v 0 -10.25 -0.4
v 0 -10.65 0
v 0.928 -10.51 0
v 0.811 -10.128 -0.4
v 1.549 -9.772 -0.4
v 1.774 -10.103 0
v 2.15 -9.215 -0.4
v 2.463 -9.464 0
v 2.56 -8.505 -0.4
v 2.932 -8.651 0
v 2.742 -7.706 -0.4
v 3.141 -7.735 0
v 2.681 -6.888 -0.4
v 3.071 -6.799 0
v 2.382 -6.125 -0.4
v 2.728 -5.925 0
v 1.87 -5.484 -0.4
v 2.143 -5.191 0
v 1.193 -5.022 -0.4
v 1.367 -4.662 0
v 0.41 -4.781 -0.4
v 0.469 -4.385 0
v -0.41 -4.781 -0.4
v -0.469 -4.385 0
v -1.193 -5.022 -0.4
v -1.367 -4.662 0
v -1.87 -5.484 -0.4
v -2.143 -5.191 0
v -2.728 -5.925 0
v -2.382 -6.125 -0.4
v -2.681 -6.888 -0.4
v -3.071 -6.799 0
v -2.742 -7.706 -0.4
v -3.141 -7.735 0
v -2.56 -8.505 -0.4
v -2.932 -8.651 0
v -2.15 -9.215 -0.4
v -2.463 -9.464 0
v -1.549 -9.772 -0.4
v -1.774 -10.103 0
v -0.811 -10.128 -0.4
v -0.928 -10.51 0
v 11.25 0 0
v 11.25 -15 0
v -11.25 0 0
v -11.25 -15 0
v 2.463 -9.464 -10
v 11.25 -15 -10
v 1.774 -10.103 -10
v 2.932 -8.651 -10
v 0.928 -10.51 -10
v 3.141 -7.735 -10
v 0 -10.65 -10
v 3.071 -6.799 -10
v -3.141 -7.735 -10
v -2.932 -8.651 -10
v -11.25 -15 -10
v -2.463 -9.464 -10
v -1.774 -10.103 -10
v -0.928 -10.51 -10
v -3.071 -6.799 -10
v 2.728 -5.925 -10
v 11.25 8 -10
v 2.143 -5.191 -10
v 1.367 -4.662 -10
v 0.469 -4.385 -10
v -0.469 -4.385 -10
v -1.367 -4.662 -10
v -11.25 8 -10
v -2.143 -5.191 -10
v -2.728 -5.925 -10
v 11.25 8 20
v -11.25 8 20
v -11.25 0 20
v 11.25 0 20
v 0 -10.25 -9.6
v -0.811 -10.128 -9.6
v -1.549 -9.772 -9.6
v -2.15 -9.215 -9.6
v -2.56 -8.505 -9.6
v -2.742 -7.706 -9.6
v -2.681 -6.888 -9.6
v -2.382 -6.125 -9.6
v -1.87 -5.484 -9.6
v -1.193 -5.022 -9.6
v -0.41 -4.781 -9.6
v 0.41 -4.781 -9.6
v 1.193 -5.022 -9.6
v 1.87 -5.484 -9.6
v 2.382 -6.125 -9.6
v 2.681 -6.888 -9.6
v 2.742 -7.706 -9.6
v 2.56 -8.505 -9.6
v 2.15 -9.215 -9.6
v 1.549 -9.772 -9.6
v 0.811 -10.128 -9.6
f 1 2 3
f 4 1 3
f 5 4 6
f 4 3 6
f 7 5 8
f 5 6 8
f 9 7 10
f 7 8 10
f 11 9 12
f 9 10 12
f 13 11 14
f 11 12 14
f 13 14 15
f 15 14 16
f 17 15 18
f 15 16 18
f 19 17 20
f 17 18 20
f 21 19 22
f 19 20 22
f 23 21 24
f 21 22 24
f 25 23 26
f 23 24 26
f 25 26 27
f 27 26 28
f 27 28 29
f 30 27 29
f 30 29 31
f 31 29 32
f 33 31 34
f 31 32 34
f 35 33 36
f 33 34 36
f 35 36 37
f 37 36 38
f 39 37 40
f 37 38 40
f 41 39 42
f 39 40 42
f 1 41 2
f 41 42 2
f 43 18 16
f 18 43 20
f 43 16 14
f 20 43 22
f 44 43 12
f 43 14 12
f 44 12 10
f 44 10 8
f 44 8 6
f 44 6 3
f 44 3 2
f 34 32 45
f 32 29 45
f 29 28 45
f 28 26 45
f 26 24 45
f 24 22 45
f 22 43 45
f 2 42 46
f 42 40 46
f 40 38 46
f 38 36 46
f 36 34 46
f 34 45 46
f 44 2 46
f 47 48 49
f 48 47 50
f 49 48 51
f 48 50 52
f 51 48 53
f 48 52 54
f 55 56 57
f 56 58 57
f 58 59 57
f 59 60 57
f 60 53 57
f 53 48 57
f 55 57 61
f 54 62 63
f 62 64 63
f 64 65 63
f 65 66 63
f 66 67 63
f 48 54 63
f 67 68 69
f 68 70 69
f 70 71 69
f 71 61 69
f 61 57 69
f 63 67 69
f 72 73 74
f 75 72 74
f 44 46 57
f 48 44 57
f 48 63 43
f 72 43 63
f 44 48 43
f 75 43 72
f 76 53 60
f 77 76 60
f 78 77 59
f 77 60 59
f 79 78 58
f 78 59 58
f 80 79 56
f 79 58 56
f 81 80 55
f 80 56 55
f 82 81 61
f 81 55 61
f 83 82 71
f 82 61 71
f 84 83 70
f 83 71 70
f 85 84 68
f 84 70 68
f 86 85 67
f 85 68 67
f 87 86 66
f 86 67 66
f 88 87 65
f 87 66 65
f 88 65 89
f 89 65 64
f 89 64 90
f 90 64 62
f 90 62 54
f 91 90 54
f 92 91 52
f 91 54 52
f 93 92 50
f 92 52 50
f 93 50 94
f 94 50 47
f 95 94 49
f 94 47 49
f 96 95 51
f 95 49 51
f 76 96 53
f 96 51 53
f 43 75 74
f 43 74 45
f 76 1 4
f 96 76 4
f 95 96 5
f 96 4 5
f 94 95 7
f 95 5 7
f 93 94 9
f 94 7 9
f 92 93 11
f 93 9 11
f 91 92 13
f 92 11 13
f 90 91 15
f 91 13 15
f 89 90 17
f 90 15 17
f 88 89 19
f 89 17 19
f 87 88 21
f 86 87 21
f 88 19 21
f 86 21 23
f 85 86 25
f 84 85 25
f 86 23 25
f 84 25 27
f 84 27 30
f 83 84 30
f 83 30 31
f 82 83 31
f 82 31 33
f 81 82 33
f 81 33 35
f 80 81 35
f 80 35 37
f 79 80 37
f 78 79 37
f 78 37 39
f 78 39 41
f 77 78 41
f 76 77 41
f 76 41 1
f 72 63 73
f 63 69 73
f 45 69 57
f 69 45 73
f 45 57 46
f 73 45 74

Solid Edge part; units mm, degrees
sketch "Sketch1" plane through (0, 0, 0) normal (1, 0, 0) x (0, 1, 0)
  line L0 (-15, 0) -> (-15, -10)
  line L1 (-15, -10) -> (8, -10)
  line L2 (8, -10) -> (8, 20)
  line L3 (8, 20) -> (0, 20)
  line L4 (0, 20) -> (0, 0)
  line L5 (0, 0) -> (-15, 0)
  dimension "D1" = 8
  dimension "D2" = 15
  dimension "D3" = 10
  dimension "D4" = 20
extrude "Protrusion1" add sketch "Sketch1" along normal mid plane 22.5
hole "Hole_1" at (0, -7.5, 0) direction (0, 0, -1) diameter 5.5 end up to next start chamfer 0.4 start chamfer angle 45 end chamfer 0.4 end chamfer angle 45
properties material "Polyethylene, low density"
